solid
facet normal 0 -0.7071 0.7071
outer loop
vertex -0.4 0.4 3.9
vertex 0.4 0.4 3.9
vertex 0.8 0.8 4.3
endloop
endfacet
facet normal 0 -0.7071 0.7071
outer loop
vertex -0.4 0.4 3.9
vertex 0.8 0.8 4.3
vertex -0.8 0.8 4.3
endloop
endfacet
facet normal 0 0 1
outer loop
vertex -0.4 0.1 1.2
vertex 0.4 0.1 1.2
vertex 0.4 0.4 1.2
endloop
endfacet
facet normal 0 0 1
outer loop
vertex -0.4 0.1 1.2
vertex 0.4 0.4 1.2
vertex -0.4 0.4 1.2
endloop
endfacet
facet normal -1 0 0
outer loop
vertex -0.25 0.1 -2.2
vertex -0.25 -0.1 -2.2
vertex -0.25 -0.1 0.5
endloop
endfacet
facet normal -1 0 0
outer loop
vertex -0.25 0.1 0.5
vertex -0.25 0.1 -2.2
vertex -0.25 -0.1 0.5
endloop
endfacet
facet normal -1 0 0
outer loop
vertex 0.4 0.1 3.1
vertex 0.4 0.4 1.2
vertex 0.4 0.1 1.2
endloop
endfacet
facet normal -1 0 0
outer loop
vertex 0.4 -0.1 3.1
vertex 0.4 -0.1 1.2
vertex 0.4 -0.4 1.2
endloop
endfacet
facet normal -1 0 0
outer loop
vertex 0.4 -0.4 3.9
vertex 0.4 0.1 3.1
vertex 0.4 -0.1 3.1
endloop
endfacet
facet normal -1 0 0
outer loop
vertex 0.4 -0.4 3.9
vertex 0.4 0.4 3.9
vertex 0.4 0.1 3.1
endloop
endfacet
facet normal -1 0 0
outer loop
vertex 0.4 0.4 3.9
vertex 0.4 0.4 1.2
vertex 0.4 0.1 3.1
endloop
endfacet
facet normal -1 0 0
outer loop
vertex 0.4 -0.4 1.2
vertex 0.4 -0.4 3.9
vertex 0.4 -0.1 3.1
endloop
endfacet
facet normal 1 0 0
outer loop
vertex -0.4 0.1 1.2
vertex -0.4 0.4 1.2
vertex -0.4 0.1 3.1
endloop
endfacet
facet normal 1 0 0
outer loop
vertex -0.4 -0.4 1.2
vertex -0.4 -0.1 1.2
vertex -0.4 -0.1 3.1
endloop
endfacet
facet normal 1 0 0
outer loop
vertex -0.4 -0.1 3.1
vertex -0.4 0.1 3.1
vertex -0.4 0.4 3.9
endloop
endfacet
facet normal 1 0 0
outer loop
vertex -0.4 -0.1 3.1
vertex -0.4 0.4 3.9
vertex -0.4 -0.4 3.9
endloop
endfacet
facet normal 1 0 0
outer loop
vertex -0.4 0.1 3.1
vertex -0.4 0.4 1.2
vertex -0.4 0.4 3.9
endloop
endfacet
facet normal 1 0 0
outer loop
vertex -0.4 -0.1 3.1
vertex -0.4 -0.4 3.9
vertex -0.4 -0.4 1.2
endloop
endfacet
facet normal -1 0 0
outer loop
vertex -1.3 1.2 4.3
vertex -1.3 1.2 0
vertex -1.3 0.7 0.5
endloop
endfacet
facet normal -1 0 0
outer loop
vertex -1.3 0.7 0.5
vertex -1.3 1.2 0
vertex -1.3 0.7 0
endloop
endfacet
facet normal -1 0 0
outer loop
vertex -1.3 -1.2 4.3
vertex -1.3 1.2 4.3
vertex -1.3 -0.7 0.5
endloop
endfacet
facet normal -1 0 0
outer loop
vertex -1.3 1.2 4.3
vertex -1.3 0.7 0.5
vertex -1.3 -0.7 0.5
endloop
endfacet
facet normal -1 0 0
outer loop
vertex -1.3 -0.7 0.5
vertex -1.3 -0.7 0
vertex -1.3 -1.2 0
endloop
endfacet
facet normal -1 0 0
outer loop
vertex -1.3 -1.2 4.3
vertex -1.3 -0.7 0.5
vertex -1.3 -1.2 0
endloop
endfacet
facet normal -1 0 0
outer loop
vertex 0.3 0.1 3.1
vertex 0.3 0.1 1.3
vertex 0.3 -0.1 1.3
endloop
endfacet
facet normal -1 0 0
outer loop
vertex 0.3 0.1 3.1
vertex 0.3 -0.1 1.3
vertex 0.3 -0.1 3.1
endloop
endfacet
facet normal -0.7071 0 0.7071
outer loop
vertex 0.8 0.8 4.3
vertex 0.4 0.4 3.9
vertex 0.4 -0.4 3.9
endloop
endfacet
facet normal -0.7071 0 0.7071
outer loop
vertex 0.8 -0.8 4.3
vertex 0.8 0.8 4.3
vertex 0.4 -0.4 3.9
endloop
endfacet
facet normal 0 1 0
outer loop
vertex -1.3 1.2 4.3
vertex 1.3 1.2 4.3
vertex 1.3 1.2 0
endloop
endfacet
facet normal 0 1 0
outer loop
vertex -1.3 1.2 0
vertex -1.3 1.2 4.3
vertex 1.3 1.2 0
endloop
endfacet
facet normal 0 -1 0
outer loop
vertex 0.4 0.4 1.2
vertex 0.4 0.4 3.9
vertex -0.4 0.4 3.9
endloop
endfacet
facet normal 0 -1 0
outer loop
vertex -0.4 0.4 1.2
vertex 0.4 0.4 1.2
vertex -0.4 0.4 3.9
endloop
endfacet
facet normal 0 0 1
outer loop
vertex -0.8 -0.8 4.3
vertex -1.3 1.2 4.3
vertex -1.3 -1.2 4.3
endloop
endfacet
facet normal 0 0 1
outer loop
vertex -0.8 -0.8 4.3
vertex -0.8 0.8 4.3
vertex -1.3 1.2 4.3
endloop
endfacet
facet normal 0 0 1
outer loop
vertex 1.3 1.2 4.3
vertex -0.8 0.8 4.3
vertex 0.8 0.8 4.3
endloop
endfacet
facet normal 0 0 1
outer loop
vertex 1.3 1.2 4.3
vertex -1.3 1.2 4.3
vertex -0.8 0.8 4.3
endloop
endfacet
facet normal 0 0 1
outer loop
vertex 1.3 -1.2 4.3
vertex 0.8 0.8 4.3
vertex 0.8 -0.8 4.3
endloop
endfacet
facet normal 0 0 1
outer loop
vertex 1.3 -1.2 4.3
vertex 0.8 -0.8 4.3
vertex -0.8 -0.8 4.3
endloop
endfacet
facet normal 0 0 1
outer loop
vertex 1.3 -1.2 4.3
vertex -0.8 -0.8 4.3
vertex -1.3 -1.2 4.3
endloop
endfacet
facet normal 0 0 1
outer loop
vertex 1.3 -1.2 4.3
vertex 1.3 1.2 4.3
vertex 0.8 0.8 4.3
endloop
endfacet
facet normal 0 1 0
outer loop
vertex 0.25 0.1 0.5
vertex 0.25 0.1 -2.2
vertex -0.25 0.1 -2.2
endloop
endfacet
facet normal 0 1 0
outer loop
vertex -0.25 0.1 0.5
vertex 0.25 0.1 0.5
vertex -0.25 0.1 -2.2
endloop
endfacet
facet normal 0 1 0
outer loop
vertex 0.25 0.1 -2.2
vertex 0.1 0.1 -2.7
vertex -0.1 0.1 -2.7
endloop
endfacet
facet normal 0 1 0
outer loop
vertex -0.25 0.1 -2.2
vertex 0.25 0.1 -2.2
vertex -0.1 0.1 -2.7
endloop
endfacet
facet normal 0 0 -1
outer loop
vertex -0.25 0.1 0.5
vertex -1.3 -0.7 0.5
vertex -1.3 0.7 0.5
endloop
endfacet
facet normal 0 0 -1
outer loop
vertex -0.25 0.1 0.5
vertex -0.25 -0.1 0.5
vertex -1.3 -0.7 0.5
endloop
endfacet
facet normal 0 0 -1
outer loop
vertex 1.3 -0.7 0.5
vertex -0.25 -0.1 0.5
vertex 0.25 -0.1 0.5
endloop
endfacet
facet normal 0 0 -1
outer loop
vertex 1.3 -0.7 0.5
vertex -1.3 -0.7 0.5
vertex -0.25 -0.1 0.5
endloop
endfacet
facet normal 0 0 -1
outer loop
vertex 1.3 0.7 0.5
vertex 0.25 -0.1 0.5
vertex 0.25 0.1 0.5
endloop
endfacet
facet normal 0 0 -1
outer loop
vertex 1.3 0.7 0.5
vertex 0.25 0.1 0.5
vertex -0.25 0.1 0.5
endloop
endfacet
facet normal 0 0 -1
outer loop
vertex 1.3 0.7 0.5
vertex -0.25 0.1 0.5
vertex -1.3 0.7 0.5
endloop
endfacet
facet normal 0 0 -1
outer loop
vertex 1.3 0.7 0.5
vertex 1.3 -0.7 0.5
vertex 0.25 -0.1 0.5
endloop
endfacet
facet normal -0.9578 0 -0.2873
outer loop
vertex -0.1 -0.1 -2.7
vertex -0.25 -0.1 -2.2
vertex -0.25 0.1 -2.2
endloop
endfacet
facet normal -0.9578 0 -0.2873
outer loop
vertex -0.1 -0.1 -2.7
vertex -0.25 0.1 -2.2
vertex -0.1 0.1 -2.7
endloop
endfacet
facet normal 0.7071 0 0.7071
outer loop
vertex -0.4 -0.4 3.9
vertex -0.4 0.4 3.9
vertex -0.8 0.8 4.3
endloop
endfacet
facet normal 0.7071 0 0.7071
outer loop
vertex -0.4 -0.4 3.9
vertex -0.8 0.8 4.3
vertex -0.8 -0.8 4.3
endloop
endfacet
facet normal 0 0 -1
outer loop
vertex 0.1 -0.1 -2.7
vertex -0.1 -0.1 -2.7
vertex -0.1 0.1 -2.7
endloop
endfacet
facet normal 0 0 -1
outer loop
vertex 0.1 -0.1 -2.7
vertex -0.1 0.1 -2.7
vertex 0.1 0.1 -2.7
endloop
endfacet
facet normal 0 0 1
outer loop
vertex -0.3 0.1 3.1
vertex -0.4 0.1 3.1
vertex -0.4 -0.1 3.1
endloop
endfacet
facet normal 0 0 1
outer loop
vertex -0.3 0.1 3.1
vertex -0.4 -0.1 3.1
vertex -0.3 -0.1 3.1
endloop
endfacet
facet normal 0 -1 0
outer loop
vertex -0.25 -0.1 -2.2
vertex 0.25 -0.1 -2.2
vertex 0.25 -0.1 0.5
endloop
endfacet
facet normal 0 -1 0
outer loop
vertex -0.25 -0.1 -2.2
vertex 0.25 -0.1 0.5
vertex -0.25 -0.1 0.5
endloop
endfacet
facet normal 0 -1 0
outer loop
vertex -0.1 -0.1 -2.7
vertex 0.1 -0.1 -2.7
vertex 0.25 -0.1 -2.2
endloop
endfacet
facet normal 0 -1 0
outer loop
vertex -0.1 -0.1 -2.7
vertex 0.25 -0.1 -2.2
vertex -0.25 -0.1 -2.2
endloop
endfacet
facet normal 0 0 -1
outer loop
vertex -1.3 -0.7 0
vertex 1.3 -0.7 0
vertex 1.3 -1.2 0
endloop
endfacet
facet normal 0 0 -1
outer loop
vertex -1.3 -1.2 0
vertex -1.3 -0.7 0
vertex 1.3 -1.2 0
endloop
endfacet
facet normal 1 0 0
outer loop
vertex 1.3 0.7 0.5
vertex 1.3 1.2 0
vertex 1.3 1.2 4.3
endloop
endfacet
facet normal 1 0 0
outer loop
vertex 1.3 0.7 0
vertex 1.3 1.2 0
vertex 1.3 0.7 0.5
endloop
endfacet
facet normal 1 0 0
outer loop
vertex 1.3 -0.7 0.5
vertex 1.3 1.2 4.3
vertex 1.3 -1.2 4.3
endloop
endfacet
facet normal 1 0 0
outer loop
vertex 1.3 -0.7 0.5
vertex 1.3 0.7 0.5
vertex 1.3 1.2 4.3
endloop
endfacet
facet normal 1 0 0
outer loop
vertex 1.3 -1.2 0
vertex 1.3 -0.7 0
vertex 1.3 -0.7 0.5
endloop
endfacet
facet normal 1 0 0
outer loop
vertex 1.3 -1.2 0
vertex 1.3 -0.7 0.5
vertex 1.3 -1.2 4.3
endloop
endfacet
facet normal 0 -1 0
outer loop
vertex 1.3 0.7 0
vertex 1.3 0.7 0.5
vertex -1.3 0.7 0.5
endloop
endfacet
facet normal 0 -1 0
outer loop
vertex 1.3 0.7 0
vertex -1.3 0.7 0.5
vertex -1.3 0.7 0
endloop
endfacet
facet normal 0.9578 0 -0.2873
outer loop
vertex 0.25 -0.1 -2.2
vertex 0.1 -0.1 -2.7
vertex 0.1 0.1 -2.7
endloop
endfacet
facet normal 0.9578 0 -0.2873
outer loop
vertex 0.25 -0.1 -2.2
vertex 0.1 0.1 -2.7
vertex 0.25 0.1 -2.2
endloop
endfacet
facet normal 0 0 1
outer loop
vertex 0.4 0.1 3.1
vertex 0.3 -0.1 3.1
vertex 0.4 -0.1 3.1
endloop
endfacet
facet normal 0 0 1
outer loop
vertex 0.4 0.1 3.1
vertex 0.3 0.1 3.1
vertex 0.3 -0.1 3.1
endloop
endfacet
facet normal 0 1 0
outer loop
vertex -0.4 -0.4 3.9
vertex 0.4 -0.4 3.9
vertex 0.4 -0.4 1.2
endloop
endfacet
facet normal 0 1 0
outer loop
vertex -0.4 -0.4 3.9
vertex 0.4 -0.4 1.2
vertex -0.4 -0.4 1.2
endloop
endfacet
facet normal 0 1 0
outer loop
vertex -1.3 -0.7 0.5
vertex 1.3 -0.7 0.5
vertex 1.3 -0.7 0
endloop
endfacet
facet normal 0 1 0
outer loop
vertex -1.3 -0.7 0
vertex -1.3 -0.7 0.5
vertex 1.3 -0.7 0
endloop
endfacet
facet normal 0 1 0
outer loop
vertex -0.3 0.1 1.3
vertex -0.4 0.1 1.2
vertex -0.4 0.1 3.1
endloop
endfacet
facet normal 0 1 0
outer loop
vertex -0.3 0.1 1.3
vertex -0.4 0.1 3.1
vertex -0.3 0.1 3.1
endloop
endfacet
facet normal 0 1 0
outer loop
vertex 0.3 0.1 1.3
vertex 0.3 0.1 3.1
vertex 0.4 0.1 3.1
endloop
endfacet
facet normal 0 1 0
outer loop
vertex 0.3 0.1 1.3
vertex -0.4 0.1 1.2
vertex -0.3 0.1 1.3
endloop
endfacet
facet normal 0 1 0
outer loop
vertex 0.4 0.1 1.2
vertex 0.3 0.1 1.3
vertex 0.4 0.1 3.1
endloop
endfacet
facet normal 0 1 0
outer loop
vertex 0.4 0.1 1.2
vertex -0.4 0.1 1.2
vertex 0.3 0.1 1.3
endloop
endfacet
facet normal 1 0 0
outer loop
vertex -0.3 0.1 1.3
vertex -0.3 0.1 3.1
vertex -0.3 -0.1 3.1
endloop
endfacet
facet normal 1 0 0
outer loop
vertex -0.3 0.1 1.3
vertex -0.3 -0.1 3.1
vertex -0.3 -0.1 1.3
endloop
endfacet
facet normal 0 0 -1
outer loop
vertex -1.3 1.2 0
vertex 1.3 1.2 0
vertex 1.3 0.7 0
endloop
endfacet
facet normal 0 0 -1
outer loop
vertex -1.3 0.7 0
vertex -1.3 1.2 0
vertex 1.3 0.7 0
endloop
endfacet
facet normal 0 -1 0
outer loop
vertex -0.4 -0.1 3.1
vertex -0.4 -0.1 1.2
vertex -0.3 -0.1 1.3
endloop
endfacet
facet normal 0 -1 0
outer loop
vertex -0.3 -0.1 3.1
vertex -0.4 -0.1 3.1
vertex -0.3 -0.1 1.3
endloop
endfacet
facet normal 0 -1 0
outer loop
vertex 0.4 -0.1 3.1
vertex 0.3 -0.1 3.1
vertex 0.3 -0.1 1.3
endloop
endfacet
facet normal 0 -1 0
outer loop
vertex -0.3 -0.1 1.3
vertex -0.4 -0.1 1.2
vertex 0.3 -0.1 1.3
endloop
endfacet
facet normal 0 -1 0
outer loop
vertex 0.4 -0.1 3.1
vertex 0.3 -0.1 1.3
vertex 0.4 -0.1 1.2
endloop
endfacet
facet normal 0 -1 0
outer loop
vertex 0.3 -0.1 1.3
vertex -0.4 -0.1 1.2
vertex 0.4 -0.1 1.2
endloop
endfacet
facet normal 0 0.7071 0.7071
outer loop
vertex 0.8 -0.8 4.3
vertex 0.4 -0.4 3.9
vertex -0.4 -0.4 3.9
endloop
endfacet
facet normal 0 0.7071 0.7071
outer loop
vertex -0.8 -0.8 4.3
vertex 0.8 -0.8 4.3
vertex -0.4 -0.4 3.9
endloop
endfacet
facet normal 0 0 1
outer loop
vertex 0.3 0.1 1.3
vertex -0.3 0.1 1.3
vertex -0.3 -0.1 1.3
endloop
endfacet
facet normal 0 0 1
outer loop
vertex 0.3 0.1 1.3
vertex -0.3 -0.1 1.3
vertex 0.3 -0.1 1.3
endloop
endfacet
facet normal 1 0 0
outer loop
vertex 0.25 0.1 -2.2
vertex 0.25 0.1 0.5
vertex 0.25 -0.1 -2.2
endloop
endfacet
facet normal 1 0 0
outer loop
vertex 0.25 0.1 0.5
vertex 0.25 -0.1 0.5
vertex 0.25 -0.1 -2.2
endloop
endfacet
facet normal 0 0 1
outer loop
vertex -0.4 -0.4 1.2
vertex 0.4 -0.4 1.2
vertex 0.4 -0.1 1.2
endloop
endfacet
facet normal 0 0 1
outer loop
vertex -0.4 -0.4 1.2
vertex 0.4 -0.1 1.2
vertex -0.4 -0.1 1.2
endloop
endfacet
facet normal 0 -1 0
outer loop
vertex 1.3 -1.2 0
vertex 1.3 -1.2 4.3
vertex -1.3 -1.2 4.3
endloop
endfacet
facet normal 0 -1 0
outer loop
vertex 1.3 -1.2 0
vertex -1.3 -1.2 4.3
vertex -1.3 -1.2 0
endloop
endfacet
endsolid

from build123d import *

# Parameters (mm, degrees)
SKETCH1_W           = 2.4
SKETCH1_H           = 4.3
BOSS_EXTRUDE1_DEPTH = 1.3
SKETCH_1_W          = 0.5
SKETCH_1_H          = 1.4
CUT_EXTRUDE_1_DEPTH = 6.166236541
SKETCH2_W           = 0.8
SKETCH2_H           = 0.8
CUT_EXTRUDE1_DEPTH  = 3.1
CHAMFER_1_SIZE      = 0.4
BOSS_EXTRUDE2_DEPTH = 0.1


with BuildPart() as part:
    # Sketch1 → Boss-Extrude1 (new, symmetric)
    with BuildSketch(Plane(origin=(0, 0, 0), x_dir=(0, -1, 0), z_dir=(1, 0, 0))):
        with Locations((0, -2.15)):
            Rectangle(SKETCH1_W, SKETCH1_H)
    extrude(amount=BOSS_EXTRUDE1_DEPTH, both=True)

    # Эскиз1 → Вырез-Вытянуть1 (cut, through all)
    with BuildSketch(Plane(origin=(1.3, 0, 0), x_dir=(0, 0, -1), z_dir=(1, 0, 0))):
        with Locations((-0.25, 0)):
            Rectangle(SKETCH_1_W, SKETCH_1_H)
    extrude(amount=-CUT_EXTRUDE_1_DEPTH, mode=Mode.SUBTRACT)

    # Sketch2 → Cut-Extrude1 (cut)
    with BuildSketch(Plane(origin=(0, 0, 4.3), x_dir=(-1, 0, 0), z_dir=(0, 0, 1))):
        Rectangle(SKETCH2_W, SKETCH2_H)
    extrude(amount=-CUT_EXTRUDE1_DEPTH, mode=Mode.SUBTRACT)

    # Фаска1
    chamfer_1_edges = [part.edges().sort_by_distance(p)[0] for p in [
        (-0.4, 0, 4.3),
        (0, -0.4, 4.3),
        (0.4, 0, 4.3),
        (0, 0.4, 4.3),
    ]]
    chamfer(chamfer_1_edges, length=CHAMFER_1_SIZE)

    # Sketch3 → Boss-Extrude2 (add, symmetric)
    with BuildSketch(Plane(origin=(0, 0, 0), x_dir=(1, 0, 0), z_dir=(0, 1, 0))):
        Polygon((-0.25, 0), (-0.25, 2.2), (-0.1, 2.7), (0.1, 2.7), (0.25, 2.2), (0.25, 0), (0.25, -0.5), (-0.25, -0.5), align=None)
        Polygon((0.4, -1.2), (-0.4, -1.2), (-0.4, -3.1), (-0.3, -3.1), (-0.3, -1.3), (0.3, -1.3), (0.3, -3.1), (0.4, -3.1), align=None)
    extrude(amount=BOSS_EXTRUDE2_DEPTH, both=True)


solid = part.part
